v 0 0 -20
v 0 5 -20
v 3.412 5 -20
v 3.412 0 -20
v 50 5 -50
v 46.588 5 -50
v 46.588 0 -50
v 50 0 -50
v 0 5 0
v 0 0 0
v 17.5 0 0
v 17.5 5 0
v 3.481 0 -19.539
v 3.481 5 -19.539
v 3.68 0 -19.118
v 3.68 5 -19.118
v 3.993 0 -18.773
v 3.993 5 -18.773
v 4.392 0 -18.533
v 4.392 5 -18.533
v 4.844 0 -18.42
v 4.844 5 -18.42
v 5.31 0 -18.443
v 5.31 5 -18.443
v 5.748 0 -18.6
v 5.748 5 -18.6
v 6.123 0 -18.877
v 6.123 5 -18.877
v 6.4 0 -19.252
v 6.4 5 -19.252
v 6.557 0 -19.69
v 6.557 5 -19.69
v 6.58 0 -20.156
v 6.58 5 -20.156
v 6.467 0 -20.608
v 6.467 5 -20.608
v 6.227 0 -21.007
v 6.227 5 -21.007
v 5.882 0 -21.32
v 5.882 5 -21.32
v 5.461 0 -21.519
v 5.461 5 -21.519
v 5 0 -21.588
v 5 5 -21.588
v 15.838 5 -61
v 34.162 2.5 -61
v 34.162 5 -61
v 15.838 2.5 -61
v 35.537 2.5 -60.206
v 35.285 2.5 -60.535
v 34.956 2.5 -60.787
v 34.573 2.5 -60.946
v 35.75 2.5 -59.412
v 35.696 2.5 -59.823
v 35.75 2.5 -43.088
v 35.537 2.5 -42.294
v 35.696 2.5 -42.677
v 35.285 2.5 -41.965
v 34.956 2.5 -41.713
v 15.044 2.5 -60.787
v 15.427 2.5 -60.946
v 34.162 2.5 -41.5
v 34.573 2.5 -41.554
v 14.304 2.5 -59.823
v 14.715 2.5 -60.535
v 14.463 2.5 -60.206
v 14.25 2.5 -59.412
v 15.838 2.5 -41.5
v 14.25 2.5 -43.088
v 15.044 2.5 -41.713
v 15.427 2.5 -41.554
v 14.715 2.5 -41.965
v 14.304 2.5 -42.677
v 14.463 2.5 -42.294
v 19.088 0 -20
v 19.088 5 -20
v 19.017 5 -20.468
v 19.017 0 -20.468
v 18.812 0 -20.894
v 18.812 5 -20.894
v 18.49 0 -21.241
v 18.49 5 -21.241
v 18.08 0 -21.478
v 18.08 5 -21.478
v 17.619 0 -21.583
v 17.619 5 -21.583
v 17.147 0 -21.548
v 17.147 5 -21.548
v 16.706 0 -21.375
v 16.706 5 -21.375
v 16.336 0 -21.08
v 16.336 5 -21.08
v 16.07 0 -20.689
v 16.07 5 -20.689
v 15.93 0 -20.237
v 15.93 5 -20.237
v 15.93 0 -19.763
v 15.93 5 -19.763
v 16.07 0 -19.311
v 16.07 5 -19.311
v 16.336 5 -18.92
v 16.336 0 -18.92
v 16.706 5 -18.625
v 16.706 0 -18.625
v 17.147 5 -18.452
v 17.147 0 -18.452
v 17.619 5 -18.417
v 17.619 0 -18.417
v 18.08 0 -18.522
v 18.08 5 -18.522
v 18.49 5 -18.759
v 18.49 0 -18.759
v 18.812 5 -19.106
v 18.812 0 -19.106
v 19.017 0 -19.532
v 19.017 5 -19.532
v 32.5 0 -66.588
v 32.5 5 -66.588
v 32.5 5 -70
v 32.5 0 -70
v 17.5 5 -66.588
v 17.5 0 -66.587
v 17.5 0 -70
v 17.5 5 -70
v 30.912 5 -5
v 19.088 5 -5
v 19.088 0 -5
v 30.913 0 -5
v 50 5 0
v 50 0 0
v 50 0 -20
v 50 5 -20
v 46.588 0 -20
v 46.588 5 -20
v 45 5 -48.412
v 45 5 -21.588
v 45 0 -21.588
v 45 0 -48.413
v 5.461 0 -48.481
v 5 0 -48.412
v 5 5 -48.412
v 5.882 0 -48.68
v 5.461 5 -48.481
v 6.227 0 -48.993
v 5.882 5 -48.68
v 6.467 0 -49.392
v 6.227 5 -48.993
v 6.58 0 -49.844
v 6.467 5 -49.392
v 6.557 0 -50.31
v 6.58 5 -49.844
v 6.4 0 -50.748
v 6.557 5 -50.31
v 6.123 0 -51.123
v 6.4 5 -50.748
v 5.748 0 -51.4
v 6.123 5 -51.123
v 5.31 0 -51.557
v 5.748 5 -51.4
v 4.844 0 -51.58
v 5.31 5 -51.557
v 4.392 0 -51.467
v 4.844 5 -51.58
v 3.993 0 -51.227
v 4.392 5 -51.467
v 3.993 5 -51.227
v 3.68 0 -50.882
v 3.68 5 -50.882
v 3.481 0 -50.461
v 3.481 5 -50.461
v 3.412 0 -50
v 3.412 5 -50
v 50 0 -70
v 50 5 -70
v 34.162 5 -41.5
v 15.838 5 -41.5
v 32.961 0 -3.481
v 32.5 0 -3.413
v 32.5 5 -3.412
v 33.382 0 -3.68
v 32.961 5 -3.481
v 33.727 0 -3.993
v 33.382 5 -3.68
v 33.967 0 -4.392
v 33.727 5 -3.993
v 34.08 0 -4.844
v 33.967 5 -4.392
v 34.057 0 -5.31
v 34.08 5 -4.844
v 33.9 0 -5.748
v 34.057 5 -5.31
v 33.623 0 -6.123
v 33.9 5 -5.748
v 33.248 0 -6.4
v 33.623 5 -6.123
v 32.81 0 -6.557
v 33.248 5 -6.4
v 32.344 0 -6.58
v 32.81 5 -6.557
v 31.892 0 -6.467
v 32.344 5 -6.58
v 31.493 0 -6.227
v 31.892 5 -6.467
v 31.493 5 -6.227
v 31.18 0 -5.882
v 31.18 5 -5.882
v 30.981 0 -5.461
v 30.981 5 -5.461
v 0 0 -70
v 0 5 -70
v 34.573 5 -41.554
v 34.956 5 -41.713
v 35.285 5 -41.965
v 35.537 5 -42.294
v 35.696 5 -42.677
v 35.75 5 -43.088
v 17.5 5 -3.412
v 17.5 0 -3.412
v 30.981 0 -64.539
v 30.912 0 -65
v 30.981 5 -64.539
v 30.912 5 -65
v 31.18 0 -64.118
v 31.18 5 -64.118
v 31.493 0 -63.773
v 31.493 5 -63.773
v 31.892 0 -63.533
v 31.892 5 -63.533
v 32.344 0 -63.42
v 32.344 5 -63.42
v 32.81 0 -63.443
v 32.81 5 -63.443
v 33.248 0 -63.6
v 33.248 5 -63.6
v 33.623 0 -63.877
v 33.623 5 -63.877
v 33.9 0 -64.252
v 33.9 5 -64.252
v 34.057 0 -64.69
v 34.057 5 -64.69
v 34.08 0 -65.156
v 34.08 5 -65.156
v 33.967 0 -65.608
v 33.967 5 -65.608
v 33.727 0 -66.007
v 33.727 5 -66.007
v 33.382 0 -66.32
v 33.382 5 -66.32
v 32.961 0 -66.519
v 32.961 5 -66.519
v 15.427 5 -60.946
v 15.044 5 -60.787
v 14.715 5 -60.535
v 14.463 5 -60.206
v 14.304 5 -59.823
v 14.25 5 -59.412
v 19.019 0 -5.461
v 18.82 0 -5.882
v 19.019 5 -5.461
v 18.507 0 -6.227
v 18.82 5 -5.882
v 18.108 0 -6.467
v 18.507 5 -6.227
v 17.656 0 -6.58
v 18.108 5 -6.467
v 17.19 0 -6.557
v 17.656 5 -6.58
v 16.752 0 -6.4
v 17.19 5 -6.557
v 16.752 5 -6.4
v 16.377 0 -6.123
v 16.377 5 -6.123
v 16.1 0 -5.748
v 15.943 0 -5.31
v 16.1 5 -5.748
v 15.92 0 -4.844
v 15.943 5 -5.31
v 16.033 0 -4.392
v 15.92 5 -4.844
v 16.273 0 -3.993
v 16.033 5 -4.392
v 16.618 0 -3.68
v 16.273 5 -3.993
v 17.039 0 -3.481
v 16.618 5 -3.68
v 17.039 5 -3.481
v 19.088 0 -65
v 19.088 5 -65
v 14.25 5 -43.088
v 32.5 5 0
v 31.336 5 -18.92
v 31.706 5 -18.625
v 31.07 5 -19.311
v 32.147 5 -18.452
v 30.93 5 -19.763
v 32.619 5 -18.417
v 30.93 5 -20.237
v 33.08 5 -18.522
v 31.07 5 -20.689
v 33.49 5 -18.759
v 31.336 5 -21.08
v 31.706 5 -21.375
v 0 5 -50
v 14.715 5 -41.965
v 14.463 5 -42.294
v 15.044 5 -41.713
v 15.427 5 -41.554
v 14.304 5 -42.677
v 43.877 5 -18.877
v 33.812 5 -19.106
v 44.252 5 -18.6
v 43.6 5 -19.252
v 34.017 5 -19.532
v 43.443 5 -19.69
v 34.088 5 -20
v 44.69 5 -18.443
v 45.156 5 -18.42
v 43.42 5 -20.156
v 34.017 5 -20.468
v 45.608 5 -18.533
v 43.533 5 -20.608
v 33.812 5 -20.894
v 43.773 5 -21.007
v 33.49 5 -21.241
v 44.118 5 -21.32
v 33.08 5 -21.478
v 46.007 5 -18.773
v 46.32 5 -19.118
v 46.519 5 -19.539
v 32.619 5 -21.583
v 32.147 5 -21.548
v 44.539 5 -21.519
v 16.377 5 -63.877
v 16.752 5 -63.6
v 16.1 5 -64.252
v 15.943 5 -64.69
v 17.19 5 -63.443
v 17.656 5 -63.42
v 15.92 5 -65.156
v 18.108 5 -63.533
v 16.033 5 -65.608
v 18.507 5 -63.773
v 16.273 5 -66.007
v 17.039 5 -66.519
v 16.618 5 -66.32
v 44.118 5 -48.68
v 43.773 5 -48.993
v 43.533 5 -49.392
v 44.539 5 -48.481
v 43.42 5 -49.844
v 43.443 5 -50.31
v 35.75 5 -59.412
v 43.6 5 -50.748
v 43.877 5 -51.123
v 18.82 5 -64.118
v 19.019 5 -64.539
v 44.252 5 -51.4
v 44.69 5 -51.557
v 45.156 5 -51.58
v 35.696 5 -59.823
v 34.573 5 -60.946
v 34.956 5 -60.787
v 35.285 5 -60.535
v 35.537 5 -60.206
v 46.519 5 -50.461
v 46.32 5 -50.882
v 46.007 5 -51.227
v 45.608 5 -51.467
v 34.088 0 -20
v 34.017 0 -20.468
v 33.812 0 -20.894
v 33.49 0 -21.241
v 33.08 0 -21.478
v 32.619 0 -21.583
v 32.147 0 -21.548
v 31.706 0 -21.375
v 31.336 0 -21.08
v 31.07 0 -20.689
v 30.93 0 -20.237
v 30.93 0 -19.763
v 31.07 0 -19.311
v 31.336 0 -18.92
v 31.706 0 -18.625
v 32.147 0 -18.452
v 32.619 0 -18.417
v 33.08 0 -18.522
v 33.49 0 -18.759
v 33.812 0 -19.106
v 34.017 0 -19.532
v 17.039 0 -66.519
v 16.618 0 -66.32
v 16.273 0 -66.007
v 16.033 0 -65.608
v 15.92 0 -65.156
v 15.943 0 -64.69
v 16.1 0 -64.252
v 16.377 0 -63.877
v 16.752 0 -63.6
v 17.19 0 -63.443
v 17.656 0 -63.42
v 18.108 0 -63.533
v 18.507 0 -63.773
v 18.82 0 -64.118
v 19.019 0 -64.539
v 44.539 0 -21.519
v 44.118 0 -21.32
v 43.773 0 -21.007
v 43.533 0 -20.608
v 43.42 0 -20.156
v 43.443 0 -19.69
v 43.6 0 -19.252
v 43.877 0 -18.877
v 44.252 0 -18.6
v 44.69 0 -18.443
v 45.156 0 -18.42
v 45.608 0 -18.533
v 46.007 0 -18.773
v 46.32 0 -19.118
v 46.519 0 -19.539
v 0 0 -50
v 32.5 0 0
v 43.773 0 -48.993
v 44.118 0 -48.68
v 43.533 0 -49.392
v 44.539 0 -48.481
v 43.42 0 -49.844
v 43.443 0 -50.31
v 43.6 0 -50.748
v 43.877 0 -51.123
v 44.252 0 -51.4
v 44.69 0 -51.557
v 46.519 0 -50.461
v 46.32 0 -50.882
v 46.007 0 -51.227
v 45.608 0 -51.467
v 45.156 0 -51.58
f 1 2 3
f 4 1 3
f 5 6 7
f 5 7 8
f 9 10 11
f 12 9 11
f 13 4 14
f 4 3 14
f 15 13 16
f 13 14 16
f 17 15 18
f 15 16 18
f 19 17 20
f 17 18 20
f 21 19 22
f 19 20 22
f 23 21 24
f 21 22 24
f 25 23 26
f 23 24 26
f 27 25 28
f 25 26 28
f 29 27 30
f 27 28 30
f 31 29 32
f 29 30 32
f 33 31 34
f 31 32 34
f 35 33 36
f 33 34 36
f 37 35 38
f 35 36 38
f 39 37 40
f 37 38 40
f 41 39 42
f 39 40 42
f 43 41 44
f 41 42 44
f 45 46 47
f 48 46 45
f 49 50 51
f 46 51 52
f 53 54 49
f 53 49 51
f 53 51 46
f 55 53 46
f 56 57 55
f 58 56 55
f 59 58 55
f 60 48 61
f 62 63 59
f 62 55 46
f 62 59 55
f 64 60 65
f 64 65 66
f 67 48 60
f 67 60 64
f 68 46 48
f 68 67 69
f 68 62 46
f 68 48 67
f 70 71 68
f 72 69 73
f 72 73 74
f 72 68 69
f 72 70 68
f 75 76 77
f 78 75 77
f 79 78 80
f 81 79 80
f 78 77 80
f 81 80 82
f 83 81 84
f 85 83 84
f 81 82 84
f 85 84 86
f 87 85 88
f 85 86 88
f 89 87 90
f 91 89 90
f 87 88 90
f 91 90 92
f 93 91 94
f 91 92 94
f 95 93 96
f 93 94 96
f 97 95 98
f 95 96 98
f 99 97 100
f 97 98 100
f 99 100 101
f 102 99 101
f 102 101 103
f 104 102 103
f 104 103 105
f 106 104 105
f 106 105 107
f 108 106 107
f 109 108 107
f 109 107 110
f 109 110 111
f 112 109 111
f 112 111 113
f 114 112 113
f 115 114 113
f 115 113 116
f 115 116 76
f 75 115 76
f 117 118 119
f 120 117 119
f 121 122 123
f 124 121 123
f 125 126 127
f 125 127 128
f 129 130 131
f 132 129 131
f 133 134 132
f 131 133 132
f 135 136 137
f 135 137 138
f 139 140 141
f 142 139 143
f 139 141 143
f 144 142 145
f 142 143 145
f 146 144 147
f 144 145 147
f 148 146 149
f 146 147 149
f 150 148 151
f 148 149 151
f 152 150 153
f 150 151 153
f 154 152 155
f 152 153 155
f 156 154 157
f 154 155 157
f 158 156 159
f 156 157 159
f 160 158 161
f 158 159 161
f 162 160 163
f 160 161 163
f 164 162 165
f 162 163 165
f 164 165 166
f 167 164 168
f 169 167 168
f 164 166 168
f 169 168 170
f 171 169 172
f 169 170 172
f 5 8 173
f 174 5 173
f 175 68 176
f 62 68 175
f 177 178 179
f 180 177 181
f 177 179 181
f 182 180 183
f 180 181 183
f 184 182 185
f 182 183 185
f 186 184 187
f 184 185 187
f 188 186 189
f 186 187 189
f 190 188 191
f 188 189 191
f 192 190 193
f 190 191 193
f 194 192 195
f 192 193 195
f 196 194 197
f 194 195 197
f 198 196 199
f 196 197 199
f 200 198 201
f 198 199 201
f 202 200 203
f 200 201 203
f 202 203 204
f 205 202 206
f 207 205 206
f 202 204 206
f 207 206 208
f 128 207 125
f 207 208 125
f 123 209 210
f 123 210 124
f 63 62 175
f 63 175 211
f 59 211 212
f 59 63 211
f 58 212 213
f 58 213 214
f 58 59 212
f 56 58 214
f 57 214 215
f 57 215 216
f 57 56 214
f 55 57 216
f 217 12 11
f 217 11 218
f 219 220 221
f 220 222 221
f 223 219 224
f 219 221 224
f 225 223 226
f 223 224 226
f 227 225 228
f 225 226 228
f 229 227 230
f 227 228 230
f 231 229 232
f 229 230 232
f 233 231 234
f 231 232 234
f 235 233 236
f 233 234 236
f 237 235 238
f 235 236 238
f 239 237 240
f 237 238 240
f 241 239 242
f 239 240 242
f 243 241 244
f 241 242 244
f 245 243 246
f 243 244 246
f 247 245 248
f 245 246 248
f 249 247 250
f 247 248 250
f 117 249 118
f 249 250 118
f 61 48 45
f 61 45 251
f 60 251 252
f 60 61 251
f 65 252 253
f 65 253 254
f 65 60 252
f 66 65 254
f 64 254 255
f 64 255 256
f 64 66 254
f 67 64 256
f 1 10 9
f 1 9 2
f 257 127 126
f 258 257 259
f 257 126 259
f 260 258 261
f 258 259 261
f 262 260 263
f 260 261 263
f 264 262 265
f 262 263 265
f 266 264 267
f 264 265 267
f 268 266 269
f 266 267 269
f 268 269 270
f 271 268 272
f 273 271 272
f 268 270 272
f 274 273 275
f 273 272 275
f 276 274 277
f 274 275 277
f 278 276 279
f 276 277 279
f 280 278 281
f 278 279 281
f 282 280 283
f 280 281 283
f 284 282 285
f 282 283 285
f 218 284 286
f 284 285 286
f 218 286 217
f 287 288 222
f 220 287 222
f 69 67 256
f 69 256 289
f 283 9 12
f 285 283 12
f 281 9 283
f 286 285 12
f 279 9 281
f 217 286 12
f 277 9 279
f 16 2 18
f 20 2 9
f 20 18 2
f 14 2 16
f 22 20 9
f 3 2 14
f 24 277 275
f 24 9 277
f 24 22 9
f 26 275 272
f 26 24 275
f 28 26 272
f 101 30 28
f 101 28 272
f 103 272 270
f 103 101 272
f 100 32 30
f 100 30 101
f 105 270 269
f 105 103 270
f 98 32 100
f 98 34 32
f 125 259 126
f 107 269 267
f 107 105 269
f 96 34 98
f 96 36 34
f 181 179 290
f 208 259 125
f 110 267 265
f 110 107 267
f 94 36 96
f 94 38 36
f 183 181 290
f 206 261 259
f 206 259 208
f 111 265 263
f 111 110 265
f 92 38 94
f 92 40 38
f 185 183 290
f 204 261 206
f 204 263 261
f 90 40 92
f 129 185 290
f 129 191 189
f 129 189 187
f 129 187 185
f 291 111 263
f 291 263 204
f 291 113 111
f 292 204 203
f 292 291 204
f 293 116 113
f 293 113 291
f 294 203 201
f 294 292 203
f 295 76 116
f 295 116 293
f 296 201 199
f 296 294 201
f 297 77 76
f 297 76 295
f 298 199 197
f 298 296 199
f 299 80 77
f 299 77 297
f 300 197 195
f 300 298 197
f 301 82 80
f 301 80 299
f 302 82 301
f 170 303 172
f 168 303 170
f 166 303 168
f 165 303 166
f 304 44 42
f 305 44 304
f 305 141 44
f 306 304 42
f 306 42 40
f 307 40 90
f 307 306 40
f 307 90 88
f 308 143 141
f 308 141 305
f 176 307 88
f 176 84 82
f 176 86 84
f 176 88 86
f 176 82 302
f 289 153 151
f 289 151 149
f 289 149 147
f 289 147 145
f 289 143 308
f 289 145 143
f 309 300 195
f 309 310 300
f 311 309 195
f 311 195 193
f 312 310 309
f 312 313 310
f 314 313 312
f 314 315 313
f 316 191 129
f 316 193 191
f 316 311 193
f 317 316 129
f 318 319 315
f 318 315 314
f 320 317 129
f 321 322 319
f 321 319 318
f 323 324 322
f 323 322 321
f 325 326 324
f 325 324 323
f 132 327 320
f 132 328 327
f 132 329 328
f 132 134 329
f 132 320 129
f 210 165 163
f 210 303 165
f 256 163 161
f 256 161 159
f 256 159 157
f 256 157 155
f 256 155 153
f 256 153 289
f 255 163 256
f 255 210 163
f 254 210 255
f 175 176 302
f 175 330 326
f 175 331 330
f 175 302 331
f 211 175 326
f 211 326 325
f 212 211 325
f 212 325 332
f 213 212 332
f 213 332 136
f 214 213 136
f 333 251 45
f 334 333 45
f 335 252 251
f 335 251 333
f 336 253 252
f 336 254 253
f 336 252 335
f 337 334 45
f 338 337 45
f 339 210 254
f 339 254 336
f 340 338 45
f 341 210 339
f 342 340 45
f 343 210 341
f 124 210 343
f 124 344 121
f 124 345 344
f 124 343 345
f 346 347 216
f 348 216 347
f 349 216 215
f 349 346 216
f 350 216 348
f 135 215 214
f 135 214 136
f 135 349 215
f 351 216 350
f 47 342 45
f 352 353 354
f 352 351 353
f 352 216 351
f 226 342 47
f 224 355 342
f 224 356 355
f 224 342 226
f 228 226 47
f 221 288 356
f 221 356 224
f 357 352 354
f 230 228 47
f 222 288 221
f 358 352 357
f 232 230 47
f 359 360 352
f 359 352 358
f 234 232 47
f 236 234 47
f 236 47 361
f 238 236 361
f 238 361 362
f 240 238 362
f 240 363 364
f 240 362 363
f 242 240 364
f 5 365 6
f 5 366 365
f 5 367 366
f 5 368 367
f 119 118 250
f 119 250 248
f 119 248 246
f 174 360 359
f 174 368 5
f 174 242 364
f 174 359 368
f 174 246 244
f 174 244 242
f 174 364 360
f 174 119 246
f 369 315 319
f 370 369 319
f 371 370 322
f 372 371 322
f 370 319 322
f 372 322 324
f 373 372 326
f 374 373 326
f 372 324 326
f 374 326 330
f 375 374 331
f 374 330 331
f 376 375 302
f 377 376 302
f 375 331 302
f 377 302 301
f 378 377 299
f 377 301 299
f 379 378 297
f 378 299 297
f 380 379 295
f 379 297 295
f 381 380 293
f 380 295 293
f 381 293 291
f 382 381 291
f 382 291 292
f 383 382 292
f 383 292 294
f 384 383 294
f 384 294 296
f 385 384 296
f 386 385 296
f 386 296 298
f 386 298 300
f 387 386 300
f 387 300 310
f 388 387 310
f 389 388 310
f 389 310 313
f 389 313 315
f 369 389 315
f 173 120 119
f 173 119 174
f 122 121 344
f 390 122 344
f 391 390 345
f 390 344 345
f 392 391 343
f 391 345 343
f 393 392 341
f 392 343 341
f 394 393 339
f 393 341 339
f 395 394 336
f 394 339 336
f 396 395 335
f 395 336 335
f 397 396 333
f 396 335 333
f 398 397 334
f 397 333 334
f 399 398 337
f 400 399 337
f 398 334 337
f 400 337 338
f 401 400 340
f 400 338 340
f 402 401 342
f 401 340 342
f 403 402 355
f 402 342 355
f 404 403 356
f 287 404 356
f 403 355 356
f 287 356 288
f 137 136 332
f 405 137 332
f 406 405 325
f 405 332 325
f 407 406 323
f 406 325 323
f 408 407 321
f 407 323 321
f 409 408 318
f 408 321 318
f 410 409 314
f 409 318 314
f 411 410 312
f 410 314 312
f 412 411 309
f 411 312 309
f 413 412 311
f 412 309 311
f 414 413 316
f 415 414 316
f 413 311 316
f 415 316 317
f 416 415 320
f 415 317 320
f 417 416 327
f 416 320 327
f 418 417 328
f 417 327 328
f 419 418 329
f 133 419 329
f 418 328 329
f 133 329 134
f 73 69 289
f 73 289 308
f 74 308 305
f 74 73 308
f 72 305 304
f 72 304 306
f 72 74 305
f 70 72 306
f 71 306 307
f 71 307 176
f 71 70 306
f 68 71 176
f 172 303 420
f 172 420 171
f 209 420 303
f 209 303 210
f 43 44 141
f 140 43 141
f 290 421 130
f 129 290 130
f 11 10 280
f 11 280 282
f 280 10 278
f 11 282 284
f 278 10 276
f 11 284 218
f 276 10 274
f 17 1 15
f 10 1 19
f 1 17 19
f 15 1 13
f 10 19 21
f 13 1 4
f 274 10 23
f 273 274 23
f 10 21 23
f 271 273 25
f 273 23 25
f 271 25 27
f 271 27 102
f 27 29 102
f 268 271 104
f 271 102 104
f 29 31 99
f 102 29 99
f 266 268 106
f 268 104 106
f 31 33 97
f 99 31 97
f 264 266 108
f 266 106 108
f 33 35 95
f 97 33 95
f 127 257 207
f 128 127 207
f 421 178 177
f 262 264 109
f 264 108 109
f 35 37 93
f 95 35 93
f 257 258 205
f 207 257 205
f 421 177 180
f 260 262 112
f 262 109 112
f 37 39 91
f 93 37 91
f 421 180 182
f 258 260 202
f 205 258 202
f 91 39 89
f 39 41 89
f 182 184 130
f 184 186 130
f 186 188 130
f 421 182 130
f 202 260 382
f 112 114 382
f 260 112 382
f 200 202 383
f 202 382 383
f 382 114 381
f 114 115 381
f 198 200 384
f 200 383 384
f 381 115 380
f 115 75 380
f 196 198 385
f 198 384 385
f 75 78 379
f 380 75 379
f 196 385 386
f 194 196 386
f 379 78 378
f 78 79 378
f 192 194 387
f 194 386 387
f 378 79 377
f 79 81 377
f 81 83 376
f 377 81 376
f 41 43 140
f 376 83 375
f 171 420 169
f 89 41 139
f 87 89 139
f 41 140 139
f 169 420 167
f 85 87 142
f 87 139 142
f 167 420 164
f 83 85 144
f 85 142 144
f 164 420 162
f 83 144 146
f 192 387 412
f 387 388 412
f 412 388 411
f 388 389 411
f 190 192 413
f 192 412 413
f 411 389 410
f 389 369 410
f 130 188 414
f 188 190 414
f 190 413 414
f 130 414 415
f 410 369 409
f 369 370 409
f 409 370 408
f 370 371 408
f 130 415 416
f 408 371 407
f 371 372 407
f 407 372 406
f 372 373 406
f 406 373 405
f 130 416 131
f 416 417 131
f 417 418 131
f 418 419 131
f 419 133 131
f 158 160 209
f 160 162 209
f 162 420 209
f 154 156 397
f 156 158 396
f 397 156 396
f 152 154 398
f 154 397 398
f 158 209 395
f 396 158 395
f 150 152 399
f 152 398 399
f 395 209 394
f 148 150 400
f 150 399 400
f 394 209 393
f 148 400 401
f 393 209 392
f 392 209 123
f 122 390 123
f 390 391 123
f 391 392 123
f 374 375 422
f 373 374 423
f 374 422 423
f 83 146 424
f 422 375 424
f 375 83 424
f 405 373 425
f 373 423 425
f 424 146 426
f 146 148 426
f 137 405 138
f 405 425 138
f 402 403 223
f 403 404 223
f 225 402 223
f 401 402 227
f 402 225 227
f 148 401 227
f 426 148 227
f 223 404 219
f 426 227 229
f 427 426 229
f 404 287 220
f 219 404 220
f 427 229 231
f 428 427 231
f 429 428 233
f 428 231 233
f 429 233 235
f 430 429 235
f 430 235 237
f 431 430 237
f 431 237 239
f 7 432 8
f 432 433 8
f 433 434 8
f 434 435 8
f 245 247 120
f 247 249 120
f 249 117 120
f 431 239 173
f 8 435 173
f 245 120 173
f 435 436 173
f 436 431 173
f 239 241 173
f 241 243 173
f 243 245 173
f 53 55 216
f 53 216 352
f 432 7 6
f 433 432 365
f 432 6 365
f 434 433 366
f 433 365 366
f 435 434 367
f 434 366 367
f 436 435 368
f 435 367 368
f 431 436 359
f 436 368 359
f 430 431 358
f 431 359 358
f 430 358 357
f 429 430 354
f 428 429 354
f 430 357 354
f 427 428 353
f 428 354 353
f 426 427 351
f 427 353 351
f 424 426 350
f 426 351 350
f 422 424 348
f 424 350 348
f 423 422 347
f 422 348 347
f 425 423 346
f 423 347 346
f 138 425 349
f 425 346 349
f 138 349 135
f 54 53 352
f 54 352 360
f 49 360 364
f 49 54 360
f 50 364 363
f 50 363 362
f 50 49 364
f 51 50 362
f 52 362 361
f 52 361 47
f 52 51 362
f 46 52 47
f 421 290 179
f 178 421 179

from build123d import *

# Parameters (mm, degrees)
SKETCH1_W               = 50
SKETCH1_H               = 70
BOSS_EXTRUDE1_DEPTH     = 5
CUT_EXTRUDE2_START      = -2.5
CUT_EXTRUDE2_DEPTH      = 2.5
SKETCH5_W               = 5
SKETCH5_H               = 30
SKETCH5_W_2             = 15
SKETCH5_H_2             = 5
CUT_EXTRUDE3_DEPTH      = 1
CUT_EXTRUDE3_DEPTH_BACK = 6
SKETCH6_R               = 1.5875
CUT_EXTRUDE4_DEPTH      = 6


with BuildPart() as part:
    # Sketch1 → Boss-Extrude1 (new body)
    with BuildSketch(Plane(origin=(0, 0, 0), x_dir=(1, 0, 0), z_dir=(0, 1, 0))):
        with Locations((25, 35)):
            Rectangle(SKETCH1_W, SKETCH1_H)
    extrude(amount=BOSS_EXTRUDE1_DEPTH)

    # Sketch4 → Cut-Extrude2 (cut)
    with BuildSketch(Plane.XZ.offset(CUT_EXTRUDE2_START)):
        with BuildLine():
            Line((34.1625, -61), (15.8375, -61))
            ThreePointArc((15.8375, -61), (14.714967985, -60.535032015), (14.25, -59.4125))
            Line((14.25, -59.4125), (14.25, -43.0875))
            ThreePointArc((14.25, -43.0875), (14.714967985, -41.964967985), (15.8375, -41.5))
            Line((15.8375, -41.5), (34.1625, -41.5))
            ThreePointArc((34.1625, -41.5), (35.285032015, -41.964967985), (35.75, -43.0875))
            Line((35.75, -43.0875), (35.75, -59.4125))
            ThreePointArc((35.75, -59.4125), (35.285032015, -60.535032015), (34.1625, -61))
        make_face()
    extrude(amount=-CUT_EXTRUDE2_DEPTH, mode=Mode.SUBTRACT)

    # Sketch5 → Cut-Extrude3 (cut, two sides)
    with BuildSketch(Plane(origin=(0, 5, 0), x_dir=(1, 0, 0), z_dir=(0, 1, 0))) as cut_extrude3_sk:
        with Locations((2.5, 35)):
            Rectangle(SKETCH5_W, SKETCH5_H)
        with Locations((25, 67.5)):
            Rectangle(SKETCH5_W_2, SKETCH5_H_2)
        with Locations((47.5, 35)):
            Rectangle(SKETCH5_W, SKETCH5_H)
        with Locations((25, 2.5)):
            Rectangle(SKETCH5_W_2, SKETCH5_H_2)
    extrude(amount=CUT_EXTRUDE3_DEPTH, mode=Mode.SUBTRACT)
    extrude(cut_extrude3_sk.sketch, amount=-CUT_EXTRUDE3_DEPTH_BACK, mode=Mode.SUBTRACT)

    # Sketch6 → Cut-Extrude4 (cut, through all)
    with BuildSketch(Plane(origin=(0, 5, 0), x_dir=(1, 0, 0), z_dir=(0, 1, 0))):
        with Locations((5, 20)):
            Circle(SKETCH6_R)
        with Locations((5, 50)):
            Circle(SKETCH6_R)
        with Locations((17.5, 65)):
            Circle(SKETCH6_R)
        with Locations((32.5, 65)):
            Circle(SKETCH6_R)
        with Locations((45, 50)):
            Circle(SKETCH6_R)
        with Locations((45, 20)):
            Circle(SKETCH6_R)
        with Locations((32.5, 5)):
            Circle(SKETCH6_R)
        with Locations((17.5, 5)):
            Circle(SKETCH6_R)
        with Locations((17.5, 20)):
            Circle(SKETCH6_R)
        with Locations((32.5, 20)):
            Circle(SKETCH6_R)
    extrude(amount=-CUT_EXTRUDE4_DEPTH, mode=Mode.SUBTRACT)


solid = part.part
